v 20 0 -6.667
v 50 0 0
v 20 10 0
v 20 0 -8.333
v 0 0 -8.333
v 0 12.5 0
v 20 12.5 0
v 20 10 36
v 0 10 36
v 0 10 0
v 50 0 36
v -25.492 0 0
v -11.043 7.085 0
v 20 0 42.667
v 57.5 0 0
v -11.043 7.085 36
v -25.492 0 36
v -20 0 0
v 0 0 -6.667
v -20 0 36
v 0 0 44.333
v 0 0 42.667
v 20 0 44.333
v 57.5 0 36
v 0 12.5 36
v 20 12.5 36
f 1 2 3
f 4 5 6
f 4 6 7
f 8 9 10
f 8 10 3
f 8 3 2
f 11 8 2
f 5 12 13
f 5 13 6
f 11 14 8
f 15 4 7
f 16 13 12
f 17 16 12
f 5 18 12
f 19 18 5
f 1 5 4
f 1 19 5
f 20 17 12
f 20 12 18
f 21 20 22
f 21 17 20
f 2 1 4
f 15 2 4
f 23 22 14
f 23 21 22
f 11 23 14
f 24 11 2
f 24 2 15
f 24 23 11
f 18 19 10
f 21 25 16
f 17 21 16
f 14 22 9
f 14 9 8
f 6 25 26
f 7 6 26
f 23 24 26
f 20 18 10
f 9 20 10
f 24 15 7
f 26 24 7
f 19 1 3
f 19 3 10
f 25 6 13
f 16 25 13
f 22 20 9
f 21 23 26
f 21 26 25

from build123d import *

# Parameters (mm, degrees)
F0_W     = 20
F0_H     = 2.5
F1_DEPTH = 36
F5_W     = 108.4840968251
F5_H     = 66.9420473278
F6_DEPTH = 25


with BuildPart() as f1:
    # F0 (on Top) → F1 (new body)
    with BuildSketch(Plane.XY):
        Polygon((-11.042611652, 7.0852233041), (-10, 5), (0, 10), (0, 12.5), align=None)
        Polygon((0, 0), (-20, 0), (-10, 5), (-11.042611652, 7.0852233041), (-30.5902134255, -2.5), (0, -2.5), align=None)
        Polygon((20, 0), (0, 0), (0, -2.5), (64.9998660191, -2.5), (20, 12.5), (20, 10), (50, 0), align=None)
        with Locations((10, 11.25)):
            Rectangle(F0_W, F0_H)
    extrude(amount=F1_DEPTH)

    # F3: sweep along a path in F2
    with BuildLine(Plane.YZ) as f3_path:
        Line((12.28813377, 36), (-2.71186623, 46))
    # F1_face (on face) → F3 (sweep)
    with BuildSketch(Plane(origin=(15.9254159415, 2.5999378956, 36), x_dir=(1, 0, 0), z_dir=(0, 0, 1))):
        Polygon((-15.9254159415, 9.9000621044), (-46.515629367, -5.0999378956), (49.0744500776, -5.0999378956), (4.0745840585, 9.9000621044), align=None)
        Polygon((4.0745840585, 7.4000621044), (34.0745840585, -2.5999378956), (-35.9254159415, -2.5999378956), (-15.9254159415, 7.4000621044), align=None, mode=Mode.SUBTRACT)
    sweep(path=f3_path.line)

    # F4: sweep along a path in F2
    with BuildLine(Plane.YZ) as f4_path:
        Line((12.28813377, 0), (-2.71186623, -10))
    # F1_face1 (on face) → F4 (sweep)
    with BuildSketch(Plane(origin=(15.9254159415, 2.5999378956, 0), x_dir=(1, 0, 0), z_dir=(0, 0, -1))):
        Polygon((-46.515629367, 5.0999378956), (-15.9254159415, -9.9000621044), (4.0745840585, -9.9000621044), (49.0744500776, 5.0999378956), align=None)
        Polygon((34.0745840585, 2.5999378956), (4.0745840585, -7.4000621044), (-15.9254159415, -7.4000621044), (-35.9254159415, 2.5999378956), align=None, mode=Mode.SUBTRACT)
    sweep(path=f4_path.line)

    # F5 (on Front) → F6 (cut)
    with BuildSketch(Plane.XZ):
        with Locations((17.6961012185, 16.9055629522)):
            Rectangle(F5_W, F5_H)
    extrude(amount=F6_DEPTH, mode=Mode.SUBTRACT)


solid = f1.part
